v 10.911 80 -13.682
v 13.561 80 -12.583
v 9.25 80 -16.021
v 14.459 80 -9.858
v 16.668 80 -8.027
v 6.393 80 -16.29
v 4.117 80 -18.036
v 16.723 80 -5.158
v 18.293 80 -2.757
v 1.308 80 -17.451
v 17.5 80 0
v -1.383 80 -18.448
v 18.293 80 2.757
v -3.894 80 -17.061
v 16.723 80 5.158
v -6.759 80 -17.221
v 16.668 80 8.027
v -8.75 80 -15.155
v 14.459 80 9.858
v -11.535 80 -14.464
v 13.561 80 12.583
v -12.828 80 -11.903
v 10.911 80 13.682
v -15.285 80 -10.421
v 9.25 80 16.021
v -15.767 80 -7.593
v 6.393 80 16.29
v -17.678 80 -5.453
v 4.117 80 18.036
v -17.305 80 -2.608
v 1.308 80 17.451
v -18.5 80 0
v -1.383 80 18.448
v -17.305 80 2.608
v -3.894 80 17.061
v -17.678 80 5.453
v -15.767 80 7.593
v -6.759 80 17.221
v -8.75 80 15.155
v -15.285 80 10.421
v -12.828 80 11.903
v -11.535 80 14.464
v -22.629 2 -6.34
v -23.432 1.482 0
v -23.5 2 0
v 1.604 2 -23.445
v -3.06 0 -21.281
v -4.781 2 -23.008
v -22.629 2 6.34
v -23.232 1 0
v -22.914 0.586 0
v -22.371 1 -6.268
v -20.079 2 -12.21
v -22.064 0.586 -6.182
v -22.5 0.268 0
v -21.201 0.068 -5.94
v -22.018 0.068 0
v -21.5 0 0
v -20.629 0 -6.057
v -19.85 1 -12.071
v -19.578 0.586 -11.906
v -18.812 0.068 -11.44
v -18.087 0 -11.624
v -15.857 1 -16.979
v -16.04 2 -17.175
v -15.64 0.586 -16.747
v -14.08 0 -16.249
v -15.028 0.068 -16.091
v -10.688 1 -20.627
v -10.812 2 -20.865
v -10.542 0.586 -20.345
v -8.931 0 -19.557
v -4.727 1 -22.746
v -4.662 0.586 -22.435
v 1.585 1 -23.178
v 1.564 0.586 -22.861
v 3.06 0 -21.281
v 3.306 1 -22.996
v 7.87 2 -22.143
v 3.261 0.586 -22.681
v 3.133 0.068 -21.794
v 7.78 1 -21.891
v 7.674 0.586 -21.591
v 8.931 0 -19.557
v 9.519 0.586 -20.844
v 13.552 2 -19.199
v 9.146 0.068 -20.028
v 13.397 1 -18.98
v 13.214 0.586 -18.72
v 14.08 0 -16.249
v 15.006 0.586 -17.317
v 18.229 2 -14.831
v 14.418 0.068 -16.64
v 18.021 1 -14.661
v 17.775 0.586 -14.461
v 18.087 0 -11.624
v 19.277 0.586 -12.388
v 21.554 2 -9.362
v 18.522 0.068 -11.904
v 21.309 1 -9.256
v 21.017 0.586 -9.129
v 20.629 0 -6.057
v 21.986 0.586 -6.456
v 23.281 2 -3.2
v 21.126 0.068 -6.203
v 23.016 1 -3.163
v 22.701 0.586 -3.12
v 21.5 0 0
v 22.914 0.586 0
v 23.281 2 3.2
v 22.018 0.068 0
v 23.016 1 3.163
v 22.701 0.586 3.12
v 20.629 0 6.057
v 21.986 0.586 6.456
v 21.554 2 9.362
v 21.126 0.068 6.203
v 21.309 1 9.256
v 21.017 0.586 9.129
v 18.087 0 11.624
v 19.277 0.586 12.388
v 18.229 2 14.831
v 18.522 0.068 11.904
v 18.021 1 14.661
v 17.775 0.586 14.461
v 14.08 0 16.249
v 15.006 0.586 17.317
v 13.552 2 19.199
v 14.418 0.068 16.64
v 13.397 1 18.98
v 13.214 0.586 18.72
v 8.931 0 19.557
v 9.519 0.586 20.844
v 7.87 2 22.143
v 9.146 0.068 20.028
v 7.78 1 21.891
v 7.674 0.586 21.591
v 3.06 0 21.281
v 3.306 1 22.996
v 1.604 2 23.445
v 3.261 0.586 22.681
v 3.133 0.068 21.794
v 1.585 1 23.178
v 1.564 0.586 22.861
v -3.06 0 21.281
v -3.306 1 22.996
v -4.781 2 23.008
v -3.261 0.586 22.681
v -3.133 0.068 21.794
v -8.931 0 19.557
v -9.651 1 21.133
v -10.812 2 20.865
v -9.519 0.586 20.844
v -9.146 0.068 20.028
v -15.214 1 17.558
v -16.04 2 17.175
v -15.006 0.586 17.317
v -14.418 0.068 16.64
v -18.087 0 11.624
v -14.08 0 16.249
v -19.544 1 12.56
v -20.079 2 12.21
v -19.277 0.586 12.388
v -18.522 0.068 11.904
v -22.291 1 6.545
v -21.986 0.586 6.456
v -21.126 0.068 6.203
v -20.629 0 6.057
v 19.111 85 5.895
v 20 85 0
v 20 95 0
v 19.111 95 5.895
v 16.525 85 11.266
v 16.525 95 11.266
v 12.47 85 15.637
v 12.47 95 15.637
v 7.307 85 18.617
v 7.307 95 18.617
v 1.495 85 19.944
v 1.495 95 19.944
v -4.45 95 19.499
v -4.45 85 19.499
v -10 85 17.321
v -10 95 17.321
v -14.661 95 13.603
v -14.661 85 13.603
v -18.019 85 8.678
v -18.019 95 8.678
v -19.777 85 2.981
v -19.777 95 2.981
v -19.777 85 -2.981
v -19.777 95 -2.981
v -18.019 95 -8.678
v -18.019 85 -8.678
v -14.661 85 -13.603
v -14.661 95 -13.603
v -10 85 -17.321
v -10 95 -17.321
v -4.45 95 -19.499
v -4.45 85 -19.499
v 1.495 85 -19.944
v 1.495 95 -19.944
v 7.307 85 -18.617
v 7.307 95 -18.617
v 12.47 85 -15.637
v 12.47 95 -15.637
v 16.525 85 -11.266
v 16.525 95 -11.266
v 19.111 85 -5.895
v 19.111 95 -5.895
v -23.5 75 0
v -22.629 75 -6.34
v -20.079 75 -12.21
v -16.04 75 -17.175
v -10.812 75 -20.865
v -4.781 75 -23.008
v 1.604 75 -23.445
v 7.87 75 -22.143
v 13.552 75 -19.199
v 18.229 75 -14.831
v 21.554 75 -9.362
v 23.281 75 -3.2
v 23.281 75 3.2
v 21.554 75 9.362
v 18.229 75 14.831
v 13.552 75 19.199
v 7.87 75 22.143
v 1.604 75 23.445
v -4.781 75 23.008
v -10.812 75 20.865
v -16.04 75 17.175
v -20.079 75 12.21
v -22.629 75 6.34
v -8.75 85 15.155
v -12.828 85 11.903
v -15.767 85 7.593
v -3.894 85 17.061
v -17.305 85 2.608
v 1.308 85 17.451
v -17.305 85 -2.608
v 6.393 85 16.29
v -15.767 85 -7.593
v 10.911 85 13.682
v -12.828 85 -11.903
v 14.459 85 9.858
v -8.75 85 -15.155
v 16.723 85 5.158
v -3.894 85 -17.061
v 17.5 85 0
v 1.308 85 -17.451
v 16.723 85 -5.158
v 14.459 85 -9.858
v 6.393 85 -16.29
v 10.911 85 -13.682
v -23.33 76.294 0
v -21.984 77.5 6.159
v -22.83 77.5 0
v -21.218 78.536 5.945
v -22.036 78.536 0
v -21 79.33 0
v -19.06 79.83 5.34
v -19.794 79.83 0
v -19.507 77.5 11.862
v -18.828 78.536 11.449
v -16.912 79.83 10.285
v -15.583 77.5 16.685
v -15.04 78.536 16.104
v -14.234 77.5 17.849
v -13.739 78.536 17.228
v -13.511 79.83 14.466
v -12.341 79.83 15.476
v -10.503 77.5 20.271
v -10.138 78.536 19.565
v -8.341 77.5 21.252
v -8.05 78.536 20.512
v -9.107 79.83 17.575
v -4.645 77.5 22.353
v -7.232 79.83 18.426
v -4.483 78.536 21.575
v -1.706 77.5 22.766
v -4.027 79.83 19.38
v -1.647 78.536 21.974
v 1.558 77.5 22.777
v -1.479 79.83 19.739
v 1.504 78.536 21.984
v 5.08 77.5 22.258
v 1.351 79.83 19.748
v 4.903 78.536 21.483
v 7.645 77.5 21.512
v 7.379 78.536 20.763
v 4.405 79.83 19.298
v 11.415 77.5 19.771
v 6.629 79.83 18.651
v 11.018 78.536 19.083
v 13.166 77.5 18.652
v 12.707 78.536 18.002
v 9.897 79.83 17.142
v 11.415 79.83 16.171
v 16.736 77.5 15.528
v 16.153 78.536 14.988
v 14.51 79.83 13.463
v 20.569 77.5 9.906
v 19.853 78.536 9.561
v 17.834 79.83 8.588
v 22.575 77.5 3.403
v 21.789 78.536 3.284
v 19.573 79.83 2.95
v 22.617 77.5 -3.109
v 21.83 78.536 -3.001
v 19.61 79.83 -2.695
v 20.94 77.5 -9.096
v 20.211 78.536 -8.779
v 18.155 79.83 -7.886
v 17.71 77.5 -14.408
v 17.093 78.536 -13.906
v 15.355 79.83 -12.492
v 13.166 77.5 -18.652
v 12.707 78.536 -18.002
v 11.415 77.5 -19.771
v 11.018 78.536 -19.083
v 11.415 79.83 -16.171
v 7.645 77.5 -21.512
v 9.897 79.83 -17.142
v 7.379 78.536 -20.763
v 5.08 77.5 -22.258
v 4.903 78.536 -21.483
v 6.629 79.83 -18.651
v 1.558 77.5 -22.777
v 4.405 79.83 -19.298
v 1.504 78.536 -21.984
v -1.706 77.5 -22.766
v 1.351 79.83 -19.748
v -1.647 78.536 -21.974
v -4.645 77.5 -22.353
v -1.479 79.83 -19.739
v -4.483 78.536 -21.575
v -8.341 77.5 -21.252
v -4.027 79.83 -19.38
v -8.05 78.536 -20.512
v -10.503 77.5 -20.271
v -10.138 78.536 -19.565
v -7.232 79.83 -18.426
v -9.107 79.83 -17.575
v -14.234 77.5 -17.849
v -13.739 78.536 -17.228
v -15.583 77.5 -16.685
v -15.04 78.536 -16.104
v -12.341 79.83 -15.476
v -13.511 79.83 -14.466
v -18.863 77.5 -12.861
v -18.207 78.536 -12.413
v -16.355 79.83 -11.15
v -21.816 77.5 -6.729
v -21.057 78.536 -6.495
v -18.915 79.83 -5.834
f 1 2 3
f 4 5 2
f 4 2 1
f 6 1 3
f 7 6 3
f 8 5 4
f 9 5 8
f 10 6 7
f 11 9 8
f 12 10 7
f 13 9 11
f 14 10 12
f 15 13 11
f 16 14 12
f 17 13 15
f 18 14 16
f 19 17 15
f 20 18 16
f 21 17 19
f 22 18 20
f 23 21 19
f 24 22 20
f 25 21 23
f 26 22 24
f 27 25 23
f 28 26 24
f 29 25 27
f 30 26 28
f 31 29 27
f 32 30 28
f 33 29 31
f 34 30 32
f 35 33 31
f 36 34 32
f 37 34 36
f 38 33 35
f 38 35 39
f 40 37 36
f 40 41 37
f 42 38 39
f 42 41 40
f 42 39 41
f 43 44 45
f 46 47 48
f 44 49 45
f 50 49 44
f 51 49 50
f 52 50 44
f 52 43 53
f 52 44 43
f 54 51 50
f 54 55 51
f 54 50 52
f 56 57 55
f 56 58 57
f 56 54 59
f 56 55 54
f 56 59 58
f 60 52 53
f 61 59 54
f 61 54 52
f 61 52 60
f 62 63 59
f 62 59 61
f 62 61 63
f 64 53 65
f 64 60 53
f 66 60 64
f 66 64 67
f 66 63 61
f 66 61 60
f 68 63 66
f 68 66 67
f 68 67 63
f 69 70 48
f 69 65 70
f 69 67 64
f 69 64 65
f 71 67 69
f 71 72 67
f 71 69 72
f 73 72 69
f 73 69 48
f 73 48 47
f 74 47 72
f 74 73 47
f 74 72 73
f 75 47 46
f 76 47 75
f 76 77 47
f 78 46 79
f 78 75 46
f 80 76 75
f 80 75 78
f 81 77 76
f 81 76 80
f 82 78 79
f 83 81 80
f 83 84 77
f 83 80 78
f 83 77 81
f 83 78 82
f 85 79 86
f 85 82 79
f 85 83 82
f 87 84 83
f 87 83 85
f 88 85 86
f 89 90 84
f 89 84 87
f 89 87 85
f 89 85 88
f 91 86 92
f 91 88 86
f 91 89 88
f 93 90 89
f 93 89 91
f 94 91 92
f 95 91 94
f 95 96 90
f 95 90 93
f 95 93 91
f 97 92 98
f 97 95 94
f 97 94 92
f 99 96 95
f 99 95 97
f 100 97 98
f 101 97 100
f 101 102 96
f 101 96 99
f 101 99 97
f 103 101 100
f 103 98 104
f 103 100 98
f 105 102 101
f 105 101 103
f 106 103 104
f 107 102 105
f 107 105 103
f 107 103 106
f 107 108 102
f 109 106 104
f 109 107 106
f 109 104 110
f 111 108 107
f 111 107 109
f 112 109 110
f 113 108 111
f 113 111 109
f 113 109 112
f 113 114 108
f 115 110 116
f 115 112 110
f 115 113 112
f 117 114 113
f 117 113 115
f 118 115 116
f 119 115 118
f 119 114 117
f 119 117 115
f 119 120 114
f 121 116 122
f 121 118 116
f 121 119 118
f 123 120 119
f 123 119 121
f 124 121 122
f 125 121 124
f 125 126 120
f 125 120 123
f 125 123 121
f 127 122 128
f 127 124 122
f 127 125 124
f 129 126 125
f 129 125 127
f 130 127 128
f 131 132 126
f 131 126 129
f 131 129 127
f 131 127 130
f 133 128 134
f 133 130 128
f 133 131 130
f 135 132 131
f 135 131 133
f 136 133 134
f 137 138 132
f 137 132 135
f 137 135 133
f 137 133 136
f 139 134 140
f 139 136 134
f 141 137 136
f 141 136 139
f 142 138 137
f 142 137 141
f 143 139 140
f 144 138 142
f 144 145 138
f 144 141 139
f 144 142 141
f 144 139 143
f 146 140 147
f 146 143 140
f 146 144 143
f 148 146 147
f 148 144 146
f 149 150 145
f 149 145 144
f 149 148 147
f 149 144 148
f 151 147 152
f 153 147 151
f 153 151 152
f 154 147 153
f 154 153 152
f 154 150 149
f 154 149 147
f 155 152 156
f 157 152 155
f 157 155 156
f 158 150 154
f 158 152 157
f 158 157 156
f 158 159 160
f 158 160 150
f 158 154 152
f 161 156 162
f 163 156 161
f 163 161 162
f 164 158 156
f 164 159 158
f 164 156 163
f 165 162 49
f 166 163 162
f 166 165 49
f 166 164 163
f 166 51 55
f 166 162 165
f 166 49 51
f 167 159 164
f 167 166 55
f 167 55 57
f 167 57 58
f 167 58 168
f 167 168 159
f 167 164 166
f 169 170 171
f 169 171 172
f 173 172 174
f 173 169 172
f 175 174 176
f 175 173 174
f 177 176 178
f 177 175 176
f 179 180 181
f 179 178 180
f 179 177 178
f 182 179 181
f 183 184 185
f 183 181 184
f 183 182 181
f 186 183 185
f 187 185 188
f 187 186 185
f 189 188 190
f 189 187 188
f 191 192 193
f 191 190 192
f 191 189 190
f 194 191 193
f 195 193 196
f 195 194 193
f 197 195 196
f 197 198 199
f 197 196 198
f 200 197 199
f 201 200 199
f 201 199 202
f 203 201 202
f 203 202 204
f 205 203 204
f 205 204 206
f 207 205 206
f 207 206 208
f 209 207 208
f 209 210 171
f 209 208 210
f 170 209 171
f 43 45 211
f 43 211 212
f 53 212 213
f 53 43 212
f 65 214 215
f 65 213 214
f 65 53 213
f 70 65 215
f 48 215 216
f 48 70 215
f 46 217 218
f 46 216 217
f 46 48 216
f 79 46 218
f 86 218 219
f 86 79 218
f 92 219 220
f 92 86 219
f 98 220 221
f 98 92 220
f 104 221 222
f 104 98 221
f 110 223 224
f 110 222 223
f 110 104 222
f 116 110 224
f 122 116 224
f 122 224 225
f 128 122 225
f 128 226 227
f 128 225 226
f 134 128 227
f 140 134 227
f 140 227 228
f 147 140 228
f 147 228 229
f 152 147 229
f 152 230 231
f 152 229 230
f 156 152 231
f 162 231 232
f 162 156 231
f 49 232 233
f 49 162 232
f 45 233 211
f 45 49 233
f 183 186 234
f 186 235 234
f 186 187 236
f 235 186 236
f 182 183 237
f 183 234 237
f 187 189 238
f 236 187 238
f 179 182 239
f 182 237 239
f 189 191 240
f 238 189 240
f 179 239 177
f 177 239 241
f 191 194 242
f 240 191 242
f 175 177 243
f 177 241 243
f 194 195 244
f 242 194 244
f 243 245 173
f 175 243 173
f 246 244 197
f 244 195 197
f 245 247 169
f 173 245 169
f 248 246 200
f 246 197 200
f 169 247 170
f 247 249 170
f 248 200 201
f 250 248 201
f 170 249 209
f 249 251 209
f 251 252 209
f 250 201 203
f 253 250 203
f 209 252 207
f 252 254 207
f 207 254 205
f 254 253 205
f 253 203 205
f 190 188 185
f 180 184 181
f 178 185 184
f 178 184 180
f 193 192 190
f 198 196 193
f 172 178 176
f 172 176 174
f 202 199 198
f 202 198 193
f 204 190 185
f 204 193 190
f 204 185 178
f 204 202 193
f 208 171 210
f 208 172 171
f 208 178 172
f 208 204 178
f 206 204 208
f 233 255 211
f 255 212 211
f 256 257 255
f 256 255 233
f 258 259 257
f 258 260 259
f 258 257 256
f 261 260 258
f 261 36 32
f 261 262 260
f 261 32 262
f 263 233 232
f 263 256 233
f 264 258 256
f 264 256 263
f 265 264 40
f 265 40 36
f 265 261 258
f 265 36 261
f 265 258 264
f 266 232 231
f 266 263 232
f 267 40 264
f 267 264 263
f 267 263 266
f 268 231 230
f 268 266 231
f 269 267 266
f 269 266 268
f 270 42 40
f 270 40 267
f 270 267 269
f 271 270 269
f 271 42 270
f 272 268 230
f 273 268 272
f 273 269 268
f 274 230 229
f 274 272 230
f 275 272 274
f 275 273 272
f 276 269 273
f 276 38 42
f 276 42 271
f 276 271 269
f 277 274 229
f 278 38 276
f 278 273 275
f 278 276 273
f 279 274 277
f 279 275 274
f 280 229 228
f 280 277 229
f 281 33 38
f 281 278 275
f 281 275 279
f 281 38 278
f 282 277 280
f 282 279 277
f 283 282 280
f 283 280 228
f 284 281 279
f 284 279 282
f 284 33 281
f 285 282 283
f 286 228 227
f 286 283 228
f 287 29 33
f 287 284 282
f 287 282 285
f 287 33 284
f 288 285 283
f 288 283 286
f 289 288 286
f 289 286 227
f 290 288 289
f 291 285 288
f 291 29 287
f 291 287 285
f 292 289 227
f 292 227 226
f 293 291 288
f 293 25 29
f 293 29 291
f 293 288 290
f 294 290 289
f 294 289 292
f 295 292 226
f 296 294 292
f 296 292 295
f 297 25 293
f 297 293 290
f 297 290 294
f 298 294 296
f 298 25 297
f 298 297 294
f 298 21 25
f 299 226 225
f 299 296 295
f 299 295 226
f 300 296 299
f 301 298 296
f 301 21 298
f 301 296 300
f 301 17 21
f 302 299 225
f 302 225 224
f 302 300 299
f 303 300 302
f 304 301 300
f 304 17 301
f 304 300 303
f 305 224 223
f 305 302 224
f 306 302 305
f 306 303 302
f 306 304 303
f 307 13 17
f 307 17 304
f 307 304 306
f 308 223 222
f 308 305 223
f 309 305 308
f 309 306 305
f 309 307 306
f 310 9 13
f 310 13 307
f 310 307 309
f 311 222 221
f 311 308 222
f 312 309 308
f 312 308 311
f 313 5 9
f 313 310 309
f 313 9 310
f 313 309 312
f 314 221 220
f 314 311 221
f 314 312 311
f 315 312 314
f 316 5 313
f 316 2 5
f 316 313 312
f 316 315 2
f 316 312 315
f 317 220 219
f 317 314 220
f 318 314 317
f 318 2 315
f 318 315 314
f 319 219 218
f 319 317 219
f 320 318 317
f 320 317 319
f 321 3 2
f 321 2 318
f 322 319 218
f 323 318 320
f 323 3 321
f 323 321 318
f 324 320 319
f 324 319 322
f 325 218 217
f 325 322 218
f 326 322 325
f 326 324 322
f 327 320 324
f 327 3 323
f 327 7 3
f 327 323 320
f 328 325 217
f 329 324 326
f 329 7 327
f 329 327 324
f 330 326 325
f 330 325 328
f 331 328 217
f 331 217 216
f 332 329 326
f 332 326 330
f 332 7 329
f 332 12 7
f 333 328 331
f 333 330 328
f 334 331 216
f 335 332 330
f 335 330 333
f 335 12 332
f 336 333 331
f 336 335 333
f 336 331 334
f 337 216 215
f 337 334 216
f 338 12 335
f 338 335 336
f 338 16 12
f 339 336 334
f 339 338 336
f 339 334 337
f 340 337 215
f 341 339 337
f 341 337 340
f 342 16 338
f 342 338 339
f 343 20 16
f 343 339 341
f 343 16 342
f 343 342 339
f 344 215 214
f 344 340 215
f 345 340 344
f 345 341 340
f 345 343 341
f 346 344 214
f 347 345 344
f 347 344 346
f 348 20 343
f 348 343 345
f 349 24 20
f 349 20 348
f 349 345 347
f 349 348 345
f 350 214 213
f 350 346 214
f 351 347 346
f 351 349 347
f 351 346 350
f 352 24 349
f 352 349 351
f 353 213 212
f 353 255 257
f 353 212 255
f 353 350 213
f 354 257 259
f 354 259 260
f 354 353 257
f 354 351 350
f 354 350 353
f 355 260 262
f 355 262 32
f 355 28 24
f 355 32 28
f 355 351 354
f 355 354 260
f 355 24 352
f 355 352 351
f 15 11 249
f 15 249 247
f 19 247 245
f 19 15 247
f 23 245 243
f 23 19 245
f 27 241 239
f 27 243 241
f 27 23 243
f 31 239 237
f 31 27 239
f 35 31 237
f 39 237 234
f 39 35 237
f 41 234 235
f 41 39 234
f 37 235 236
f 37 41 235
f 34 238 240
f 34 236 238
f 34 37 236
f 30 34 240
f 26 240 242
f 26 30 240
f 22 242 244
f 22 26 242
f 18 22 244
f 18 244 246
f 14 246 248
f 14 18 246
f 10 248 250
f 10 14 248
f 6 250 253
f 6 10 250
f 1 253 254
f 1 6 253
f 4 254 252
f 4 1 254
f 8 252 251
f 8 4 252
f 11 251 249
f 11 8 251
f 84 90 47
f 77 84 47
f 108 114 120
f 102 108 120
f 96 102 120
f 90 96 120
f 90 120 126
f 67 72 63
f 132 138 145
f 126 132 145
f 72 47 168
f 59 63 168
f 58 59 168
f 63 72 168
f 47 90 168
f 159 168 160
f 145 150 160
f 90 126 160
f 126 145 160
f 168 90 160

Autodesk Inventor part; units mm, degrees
ref_plane "YZ Plane" through (0, 0, 0) normal (1, 0, 0) x (0, 1, 0)
ref_plane "XZ Plane" through (0, 0, 0) normal (0, 1, 0) x (-1, 0, 0)
ref_plane "XY Plane" through (0, 0, 0) normal (0, 0, 1) x (1, 0, 0)
sketch "Sketch1" plane through (0, 0, 0) normal (0, 1, 0) x (-1, 0, 0)
  circle A0 centre (0, 0) radius 23.5
  dimension "d0" = 47
extrude "Extrusion1" add sketch "Sketch1" along normal blind 80
sketch "Sketch2" plane through (0, 80, 0) normal (0, 1, 0) x (1, 0, 0)
  circle A0 centre (0, 0) radius 17.5
  dimension "d3" = 35
extrude "Extrusion2" add sketch "Sketch2" along normal blind 5
sketch "Sketch3" plane through (0, 85, 0) normal (0, 1, 0) x (1, 0, 0)
  circle A0 centre (0, 0) radius 20
  dimension "d6" = 40
extrude "Extrusion3" add sketch "Sketch3" along normal blind 10
fillet "Fillet1" radius 2 1 edges at (23.5, 0, 0)
fillet "Fillet2" radius 5 1 edges at (23.5, 80, 0)
properties part number "Tarro"
